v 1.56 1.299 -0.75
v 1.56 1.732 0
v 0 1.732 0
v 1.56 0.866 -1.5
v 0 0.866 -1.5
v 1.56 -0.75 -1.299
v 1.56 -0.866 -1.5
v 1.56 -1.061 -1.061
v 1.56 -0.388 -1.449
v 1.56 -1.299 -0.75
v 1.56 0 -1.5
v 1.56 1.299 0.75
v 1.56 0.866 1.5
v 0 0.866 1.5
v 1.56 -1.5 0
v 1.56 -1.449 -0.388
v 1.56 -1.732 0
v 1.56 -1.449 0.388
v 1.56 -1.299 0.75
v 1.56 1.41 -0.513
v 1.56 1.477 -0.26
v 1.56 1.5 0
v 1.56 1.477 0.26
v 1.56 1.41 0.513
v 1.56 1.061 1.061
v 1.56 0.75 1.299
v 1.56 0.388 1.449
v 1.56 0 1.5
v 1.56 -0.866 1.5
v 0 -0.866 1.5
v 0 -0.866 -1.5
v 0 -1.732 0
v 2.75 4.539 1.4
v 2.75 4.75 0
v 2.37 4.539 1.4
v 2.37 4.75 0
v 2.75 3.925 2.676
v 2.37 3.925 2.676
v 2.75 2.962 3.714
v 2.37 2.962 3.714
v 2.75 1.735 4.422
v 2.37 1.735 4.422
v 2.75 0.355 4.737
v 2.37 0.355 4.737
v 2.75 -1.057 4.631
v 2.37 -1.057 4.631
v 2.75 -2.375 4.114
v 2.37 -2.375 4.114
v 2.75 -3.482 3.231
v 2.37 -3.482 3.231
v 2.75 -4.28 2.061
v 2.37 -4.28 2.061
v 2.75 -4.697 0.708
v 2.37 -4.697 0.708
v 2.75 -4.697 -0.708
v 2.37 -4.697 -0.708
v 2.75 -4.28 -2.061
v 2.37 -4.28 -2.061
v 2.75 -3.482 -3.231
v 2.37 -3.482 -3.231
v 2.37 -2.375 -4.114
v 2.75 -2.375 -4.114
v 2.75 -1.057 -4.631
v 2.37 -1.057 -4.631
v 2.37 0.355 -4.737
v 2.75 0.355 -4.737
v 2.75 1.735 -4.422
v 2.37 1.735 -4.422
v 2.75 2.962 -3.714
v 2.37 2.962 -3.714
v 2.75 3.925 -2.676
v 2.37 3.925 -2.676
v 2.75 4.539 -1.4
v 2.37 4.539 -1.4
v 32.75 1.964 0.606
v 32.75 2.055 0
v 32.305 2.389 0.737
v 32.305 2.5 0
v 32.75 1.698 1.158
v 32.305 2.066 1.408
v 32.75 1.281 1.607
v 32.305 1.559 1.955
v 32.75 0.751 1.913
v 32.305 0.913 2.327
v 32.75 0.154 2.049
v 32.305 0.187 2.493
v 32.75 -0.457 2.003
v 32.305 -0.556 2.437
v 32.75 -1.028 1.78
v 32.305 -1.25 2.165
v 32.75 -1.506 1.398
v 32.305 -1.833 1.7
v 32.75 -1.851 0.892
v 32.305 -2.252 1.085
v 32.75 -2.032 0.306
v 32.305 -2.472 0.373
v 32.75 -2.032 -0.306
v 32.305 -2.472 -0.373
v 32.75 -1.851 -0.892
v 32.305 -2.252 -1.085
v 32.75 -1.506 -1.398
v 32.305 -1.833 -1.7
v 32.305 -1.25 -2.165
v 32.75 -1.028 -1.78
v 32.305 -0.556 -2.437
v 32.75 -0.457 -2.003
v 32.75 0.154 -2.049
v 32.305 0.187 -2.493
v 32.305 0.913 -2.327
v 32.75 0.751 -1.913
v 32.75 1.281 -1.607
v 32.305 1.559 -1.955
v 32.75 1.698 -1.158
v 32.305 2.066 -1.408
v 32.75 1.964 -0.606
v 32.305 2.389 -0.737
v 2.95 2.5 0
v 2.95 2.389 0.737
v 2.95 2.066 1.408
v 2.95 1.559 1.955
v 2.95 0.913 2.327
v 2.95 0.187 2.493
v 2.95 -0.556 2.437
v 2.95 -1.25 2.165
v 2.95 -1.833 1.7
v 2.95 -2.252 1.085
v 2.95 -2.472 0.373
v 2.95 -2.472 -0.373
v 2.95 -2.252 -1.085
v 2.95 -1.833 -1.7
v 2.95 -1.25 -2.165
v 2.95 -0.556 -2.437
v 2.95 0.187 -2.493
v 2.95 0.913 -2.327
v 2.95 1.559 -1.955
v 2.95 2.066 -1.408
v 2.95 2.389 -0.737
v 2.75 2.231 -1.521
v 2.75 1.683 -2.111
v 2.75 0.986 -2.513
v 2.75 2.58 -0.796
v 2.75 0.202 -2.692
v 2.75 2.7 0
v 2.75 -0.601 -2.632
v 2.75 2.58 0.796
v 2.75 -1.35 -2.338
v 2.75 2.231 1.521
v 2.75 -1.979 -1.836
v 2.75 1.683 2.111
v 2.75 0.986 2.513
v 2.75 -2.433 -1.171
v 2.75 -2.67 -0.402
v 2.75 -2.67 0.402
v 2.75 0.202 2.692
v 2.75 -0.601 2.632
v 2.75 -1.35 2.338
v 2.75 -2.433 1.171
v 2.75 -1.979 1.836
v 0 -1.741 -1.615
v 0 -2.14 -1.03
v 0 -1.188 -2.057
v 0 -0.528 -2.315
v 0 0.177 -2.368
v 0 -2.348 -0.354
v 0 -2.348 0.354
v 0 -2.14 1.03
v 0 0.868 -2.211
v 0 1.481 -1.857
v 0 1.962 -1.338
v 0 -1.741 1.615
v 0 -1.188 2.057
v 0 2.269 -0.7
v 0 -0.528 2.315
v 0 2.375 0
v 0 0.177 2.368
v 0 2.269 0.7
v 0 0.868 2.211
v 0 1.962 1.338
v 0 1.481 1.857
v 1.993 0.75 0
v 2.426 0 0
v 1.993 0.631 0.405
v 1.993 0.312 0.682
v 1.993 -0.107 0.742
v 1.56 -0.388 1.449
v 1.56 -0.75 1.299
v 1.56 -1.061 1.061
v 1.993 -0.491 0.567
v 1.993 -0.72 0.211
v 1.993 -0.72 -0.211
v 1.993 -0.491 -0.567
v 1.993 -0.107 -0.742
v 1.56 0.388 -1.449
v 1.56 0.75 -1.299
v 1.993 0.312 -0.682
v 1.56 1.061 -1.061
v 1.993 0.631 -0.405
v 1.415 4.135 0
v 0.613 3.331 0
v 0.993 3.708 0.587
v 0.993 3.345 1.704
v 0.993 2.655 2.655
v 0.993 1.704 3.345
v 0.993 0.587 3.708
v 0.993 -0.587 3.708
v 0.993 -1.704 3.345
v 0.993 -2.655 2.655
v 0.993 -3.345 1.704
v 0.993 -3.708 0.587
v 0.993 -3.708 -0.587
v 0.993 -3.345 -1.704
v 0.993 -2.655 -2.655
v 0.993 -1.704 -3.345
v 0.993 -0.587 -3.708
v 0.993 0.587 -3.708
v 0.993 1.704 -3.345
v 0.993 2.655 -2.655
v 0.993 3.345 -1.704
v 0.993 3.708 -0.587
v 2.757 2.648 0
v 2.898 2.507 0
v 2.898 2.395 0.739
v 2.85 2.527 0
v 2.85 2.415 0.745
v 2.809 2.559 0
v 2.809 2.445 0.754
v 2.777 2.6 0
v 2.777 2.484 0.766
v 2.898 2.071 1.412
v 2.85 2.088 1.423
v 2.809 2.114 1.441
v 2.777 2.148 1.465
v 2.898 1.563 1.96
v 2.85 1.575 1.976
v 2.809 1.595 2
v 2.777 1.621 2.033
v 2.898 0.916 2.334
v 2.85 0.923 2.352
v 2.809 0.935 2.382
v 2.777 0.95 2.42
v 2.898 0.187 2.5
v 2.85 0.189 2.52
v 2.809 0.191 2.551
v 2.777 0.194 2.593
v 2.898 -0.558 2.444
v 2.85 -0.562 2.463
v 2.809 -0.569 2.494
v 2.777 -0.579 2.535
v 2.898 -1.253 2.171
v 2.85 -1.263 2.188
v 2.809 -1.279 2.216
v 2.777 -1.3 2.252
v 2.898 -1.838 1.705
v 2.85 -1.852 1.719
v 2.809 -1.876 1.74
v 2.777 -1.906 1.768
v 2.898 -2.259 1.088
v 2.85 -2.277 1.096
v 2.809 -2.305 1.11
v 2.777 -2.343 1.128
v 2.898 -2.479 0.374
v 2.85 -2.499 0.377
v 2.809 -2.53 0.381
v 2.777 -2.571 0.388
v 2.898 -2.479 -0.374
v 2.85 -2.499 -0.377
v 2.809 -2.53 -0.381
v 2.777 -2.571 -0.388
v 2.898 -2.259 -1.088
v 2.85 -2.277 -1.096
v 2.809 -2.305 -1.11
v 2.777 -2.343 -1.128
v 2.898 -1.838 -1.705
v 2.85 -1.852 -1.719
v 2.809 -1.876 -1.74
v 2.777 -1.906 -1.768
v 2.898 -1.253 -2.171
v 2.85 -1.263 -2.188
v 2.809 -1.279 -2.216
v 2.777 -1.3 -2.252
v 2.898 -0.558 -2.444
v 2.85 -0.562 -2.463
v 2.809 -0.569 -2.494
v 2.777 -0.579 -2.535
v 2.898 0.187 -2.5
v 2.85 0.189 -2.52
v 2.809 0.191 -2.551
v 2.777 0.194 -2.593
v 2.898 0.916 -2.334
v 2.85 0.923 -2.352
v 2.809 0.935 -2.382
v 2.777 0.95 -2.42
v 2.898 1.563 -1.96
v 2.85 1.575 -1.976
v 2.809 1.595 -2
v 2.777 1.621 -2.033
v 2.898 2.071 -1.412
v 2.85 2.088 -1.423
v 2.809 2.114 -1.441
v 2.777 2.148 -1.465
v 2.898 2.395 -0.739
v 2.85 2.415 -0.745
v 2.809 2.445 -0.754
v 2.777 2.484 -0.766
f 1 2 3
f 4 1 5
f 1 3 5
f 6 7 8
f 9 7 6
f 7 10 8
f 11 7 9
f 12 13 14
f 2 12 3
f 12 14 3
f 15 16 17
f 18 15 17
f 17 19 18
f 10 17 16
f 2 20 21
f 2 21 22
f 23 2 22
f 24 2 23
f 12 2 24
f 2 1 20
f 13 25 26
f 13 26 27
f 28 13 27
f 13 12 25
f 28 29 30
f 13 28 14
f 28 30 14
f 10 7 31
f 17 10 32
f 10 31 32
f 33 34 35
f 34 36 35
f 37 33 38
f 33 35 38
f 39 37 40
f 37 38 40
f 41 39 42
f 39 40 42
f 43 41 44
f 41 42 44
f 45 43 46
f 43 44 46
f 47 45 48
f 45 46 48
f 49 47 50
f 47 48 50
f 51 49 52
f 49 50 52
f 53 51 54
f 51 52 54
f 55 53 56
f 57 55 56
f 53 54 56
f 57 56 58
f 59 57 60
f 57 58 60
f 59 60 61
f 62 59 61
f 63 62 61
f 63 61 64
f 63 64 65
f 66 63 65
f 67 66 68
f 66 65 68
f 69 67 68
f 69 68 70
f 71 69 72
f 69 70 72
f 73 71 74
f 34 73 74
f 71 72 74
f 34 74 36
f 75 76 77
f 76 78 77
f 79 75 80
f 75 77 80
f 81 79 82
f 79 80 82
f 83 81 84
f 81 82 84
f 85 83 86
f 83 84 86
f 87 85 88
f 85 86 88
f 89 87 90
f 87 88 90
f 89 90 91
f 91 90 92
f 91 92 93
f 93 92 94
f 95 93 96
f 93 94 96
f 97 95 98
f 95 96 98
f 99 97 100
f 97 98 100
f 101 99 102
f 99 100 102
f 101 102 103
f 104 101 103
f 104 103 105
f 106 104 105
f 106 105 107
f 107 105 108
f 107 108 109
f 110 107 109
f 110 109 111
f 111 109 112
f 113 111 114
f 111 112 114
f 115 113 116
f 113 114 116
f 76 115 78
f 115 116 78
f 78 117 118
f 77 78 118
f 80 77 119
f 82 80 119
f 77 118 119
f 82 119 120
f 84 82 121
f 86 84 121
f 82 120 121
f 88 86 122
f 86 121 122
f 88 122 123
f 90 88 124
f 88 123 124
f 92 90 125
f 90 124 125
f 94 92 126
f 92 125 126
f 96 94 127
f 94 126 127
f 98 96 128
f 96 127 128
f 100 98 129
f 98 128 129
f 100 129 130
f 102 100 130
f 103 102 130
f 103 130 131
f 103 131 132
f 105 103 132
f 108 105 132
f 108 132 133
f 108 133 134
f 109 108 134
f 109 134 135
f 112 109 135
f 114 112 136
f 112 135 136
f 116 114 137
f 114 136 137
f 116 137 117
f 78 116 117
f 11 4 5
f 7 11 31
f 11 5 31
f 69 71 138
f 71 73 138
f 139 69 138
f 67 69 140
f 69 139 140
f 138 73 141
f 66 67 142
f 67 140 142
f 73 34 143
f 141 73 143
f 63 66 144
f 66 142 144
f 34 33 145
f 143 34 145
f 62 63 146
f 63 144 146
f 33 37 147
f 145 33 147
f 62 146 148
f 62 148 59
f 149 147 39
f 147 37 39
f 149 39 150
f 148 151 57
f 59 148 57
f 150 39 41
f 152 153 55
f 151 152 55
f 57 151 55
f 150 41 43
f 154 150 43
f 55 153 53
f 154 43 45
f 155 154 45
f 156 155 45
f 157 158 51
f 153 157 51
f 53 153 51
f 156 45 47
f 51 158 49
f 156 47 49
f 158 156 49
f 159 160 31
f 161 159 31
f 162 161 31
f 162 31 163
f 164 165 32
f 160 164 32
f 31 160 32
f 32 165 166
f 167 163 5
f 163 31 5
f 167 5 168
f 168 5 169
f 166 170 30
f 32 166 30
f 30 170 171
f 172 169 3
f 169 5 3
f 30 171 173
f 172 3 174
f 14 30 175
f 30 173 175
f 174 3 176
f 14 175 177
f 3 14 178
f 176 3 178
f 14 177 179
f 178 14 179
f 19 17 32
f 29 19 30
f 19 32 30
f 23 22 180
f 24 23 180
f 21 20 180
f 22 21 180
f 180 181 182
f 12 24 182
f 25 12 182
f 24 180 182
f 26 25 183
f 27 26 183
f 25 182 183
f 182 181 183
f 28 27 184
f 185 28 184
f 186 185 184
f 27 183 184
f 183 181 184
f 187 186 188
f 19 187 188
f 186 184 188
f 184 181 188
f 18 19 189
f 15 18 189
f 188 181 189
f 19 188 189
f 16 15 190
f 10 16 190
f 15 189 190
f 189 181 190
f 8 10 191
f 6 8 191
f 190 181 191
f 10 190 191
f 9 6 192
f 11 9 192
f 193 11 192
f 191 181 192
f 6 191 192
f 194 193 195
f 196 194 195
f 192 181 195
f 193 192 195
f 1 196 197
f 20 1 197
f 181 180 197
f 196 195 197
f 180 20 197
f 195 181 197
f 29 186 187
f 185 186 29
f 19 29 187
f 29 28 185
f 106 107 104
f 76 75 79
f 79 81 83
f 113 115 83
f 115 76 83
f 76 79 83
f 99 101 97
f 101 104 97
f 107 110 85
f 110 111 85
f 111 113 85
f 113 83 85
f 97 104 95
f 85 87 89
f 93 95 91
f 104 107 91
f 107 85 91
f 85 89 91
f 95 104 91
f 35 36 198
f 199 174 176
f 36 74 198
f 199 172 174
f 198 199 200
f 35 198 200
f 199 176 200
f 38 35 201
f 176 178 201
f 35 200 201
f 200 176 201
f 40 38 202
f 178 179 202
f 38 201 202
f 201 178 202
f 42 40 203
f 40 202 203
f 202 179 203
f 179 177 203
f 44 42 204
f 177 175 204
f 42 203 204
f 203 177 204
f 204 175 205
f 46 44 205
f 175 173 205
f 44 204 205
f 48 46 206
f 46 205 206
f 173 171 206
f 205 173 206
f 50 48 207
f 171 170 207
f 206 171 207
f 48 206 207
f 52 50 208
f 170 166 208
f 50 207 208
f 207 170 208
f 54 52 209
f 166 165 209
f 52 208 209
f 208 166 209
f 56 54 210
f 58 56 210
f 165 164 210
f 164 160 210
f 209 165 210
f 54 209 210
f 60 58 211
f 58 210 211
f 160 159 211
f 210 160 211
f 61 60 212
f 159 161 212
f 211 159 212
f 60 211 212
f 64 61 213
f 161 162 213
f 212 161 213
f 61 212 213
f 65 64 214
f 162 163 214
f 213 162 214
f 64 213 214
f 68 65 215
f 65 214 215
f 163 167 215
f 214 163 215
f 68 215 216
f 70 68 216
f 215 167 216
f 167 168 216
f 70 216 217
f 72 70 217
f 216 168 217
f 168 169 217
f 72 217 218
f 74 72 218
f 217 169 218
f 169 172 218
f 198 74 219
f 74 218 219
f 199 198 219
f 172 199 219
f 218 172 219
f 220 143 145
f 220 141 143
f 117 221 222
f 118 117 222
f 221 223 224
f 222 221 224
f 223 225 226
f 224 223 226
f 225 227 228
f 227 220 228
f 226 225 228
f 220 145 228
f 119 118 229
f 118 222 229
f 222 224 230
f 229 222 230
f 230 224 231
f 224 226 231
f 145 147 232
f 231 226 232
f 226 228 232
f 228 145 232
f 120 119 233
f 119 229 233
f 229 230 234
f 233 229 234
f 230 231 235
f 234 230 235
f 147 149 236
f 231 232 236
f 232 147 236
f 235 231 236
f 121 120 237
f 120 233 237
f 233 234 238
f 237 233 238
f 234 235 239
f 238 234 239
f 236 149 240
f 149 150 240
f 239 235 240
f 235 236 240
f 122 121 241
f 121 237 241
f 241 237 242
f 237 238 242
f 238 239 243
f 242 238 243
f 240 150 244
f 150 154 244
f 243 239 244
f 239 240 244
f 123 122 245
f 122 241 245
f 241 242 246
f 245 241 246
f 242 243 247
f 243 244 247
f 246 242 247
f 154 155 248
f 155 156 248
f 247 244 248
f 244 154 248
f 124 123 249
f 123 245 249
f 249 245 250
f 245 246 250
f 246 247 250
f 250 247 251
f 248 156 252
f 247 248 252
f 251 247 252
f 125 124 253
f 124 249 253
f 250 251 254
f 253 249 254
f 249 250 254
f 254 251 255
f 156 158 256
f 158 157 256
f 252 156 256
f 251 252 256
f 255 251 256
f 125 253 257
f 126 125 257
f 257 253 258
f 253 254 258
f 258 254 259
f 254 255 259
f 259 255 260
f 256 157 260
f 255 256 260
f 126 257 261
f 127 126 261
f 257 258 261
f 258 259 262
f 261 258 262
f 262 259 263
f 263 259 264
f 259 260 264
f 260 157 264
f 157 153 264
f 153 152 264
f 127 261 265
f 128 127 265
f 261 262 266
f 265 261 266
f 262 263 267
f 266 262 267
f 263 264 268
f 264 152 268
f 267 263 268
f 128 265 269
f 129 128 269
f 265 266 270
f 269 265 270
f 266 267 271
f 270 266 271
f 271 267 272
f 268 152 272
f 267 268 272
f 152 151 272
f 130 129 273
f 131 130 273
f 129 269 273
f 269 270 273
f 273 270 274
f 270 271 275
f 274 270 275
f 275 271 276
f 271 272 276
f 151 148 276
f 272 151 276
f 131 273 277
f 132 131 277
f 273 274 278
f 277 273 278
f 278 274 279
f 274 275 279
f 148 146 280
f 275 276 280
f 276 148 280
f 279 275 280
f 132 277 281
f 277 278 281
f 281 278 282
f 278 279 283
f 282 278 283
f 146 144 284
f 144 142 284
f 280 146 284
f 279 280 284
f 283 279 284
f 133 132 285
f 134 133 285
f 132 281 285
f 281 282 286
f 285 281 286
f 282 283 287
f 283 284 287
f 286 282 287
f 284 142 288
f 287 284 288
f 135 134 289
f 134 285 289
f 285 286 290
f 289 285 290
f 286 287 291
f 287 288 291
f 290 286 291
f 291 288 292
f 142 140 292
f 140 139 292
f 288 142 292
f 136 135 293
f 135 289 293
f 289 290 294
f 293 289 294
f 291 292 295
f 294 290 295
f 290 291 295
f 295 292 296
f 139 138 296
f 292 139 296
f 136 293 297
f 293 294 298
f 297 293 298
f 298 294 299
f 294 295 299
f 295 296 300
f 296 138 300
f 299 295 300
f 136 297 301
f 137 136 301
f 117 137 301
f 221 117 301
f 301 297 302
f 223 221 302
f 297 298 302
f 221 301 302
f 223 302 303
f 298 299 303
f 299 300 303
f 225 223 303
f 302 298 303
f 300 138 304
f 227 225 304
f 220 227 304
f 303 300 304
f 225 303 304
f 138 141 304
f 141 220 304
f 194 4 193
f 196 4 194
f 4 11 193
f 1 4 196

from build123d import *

# Parameters (mm, degrees)
FILLET1_R   = 0.2
HEX_2_DEPTH = 1.56


with BuildPart() as part:
    # BodySke → BaseBody (revolve)
    with BuildSketch(Plane.XY):
        with BuildLine():
            Line((32.75, 0), (32.75, 2.055))
            Line((32.75, 2.055), (32.305, 2.5))
            Line((32.305, 2.5), (2.75, 2.5))
            Line((2.75, 2.5), (2.75, 4.75))
            Line((2.75, 4.75), (2.37, 4.75))
            ThreePointArc((2.37, 4.75), (0.992680215, 3.754414901), (0, 2.375))
            Line((0, 2.375), (0, 0))
            Line((0, 0), (32.75, 0))
        make_face()
    revolve(axis=Axis((0, 0, 0), (1, 0, 0)))

    # Fillet1
    fillet1_edges = [part.edges().sort_by_distance(p)[0] for p in [
        (2.75, -2.5, 0),
    ]]
    fillet(fillet1_edges, radius=FILLET1_R)

    # Sketch2 → PreBroach (revolve, cut)
    with BuildSketch(Plane.XY):
        Polygon((0, 1.5), (1.56, 1.5), (2.426025404, 0), (0, 0), align=None)
    revolve(axis=Axis((0, 0, 0), (1, 0, 0)), mode=Mode.SUBTRACT)

    # Sketch3 → Hex 2 (cut)
    with BuildSketch(Plane(origin=(0, 0, 0), x_dir=(0, 0, -1), z_dir=(1, 0, 0))):
        Polygon((-1.5, -0.866025404), (-1.5, 0.866025404), (0, 1.732050808), (1.5, 0.866025404), (1.5, -0.866025404), (0, -1.732050808), align=None)
    extrude(amount=HEX_2_DEPTH, mode=Mode.SUBTRACT)


solid = part.part
